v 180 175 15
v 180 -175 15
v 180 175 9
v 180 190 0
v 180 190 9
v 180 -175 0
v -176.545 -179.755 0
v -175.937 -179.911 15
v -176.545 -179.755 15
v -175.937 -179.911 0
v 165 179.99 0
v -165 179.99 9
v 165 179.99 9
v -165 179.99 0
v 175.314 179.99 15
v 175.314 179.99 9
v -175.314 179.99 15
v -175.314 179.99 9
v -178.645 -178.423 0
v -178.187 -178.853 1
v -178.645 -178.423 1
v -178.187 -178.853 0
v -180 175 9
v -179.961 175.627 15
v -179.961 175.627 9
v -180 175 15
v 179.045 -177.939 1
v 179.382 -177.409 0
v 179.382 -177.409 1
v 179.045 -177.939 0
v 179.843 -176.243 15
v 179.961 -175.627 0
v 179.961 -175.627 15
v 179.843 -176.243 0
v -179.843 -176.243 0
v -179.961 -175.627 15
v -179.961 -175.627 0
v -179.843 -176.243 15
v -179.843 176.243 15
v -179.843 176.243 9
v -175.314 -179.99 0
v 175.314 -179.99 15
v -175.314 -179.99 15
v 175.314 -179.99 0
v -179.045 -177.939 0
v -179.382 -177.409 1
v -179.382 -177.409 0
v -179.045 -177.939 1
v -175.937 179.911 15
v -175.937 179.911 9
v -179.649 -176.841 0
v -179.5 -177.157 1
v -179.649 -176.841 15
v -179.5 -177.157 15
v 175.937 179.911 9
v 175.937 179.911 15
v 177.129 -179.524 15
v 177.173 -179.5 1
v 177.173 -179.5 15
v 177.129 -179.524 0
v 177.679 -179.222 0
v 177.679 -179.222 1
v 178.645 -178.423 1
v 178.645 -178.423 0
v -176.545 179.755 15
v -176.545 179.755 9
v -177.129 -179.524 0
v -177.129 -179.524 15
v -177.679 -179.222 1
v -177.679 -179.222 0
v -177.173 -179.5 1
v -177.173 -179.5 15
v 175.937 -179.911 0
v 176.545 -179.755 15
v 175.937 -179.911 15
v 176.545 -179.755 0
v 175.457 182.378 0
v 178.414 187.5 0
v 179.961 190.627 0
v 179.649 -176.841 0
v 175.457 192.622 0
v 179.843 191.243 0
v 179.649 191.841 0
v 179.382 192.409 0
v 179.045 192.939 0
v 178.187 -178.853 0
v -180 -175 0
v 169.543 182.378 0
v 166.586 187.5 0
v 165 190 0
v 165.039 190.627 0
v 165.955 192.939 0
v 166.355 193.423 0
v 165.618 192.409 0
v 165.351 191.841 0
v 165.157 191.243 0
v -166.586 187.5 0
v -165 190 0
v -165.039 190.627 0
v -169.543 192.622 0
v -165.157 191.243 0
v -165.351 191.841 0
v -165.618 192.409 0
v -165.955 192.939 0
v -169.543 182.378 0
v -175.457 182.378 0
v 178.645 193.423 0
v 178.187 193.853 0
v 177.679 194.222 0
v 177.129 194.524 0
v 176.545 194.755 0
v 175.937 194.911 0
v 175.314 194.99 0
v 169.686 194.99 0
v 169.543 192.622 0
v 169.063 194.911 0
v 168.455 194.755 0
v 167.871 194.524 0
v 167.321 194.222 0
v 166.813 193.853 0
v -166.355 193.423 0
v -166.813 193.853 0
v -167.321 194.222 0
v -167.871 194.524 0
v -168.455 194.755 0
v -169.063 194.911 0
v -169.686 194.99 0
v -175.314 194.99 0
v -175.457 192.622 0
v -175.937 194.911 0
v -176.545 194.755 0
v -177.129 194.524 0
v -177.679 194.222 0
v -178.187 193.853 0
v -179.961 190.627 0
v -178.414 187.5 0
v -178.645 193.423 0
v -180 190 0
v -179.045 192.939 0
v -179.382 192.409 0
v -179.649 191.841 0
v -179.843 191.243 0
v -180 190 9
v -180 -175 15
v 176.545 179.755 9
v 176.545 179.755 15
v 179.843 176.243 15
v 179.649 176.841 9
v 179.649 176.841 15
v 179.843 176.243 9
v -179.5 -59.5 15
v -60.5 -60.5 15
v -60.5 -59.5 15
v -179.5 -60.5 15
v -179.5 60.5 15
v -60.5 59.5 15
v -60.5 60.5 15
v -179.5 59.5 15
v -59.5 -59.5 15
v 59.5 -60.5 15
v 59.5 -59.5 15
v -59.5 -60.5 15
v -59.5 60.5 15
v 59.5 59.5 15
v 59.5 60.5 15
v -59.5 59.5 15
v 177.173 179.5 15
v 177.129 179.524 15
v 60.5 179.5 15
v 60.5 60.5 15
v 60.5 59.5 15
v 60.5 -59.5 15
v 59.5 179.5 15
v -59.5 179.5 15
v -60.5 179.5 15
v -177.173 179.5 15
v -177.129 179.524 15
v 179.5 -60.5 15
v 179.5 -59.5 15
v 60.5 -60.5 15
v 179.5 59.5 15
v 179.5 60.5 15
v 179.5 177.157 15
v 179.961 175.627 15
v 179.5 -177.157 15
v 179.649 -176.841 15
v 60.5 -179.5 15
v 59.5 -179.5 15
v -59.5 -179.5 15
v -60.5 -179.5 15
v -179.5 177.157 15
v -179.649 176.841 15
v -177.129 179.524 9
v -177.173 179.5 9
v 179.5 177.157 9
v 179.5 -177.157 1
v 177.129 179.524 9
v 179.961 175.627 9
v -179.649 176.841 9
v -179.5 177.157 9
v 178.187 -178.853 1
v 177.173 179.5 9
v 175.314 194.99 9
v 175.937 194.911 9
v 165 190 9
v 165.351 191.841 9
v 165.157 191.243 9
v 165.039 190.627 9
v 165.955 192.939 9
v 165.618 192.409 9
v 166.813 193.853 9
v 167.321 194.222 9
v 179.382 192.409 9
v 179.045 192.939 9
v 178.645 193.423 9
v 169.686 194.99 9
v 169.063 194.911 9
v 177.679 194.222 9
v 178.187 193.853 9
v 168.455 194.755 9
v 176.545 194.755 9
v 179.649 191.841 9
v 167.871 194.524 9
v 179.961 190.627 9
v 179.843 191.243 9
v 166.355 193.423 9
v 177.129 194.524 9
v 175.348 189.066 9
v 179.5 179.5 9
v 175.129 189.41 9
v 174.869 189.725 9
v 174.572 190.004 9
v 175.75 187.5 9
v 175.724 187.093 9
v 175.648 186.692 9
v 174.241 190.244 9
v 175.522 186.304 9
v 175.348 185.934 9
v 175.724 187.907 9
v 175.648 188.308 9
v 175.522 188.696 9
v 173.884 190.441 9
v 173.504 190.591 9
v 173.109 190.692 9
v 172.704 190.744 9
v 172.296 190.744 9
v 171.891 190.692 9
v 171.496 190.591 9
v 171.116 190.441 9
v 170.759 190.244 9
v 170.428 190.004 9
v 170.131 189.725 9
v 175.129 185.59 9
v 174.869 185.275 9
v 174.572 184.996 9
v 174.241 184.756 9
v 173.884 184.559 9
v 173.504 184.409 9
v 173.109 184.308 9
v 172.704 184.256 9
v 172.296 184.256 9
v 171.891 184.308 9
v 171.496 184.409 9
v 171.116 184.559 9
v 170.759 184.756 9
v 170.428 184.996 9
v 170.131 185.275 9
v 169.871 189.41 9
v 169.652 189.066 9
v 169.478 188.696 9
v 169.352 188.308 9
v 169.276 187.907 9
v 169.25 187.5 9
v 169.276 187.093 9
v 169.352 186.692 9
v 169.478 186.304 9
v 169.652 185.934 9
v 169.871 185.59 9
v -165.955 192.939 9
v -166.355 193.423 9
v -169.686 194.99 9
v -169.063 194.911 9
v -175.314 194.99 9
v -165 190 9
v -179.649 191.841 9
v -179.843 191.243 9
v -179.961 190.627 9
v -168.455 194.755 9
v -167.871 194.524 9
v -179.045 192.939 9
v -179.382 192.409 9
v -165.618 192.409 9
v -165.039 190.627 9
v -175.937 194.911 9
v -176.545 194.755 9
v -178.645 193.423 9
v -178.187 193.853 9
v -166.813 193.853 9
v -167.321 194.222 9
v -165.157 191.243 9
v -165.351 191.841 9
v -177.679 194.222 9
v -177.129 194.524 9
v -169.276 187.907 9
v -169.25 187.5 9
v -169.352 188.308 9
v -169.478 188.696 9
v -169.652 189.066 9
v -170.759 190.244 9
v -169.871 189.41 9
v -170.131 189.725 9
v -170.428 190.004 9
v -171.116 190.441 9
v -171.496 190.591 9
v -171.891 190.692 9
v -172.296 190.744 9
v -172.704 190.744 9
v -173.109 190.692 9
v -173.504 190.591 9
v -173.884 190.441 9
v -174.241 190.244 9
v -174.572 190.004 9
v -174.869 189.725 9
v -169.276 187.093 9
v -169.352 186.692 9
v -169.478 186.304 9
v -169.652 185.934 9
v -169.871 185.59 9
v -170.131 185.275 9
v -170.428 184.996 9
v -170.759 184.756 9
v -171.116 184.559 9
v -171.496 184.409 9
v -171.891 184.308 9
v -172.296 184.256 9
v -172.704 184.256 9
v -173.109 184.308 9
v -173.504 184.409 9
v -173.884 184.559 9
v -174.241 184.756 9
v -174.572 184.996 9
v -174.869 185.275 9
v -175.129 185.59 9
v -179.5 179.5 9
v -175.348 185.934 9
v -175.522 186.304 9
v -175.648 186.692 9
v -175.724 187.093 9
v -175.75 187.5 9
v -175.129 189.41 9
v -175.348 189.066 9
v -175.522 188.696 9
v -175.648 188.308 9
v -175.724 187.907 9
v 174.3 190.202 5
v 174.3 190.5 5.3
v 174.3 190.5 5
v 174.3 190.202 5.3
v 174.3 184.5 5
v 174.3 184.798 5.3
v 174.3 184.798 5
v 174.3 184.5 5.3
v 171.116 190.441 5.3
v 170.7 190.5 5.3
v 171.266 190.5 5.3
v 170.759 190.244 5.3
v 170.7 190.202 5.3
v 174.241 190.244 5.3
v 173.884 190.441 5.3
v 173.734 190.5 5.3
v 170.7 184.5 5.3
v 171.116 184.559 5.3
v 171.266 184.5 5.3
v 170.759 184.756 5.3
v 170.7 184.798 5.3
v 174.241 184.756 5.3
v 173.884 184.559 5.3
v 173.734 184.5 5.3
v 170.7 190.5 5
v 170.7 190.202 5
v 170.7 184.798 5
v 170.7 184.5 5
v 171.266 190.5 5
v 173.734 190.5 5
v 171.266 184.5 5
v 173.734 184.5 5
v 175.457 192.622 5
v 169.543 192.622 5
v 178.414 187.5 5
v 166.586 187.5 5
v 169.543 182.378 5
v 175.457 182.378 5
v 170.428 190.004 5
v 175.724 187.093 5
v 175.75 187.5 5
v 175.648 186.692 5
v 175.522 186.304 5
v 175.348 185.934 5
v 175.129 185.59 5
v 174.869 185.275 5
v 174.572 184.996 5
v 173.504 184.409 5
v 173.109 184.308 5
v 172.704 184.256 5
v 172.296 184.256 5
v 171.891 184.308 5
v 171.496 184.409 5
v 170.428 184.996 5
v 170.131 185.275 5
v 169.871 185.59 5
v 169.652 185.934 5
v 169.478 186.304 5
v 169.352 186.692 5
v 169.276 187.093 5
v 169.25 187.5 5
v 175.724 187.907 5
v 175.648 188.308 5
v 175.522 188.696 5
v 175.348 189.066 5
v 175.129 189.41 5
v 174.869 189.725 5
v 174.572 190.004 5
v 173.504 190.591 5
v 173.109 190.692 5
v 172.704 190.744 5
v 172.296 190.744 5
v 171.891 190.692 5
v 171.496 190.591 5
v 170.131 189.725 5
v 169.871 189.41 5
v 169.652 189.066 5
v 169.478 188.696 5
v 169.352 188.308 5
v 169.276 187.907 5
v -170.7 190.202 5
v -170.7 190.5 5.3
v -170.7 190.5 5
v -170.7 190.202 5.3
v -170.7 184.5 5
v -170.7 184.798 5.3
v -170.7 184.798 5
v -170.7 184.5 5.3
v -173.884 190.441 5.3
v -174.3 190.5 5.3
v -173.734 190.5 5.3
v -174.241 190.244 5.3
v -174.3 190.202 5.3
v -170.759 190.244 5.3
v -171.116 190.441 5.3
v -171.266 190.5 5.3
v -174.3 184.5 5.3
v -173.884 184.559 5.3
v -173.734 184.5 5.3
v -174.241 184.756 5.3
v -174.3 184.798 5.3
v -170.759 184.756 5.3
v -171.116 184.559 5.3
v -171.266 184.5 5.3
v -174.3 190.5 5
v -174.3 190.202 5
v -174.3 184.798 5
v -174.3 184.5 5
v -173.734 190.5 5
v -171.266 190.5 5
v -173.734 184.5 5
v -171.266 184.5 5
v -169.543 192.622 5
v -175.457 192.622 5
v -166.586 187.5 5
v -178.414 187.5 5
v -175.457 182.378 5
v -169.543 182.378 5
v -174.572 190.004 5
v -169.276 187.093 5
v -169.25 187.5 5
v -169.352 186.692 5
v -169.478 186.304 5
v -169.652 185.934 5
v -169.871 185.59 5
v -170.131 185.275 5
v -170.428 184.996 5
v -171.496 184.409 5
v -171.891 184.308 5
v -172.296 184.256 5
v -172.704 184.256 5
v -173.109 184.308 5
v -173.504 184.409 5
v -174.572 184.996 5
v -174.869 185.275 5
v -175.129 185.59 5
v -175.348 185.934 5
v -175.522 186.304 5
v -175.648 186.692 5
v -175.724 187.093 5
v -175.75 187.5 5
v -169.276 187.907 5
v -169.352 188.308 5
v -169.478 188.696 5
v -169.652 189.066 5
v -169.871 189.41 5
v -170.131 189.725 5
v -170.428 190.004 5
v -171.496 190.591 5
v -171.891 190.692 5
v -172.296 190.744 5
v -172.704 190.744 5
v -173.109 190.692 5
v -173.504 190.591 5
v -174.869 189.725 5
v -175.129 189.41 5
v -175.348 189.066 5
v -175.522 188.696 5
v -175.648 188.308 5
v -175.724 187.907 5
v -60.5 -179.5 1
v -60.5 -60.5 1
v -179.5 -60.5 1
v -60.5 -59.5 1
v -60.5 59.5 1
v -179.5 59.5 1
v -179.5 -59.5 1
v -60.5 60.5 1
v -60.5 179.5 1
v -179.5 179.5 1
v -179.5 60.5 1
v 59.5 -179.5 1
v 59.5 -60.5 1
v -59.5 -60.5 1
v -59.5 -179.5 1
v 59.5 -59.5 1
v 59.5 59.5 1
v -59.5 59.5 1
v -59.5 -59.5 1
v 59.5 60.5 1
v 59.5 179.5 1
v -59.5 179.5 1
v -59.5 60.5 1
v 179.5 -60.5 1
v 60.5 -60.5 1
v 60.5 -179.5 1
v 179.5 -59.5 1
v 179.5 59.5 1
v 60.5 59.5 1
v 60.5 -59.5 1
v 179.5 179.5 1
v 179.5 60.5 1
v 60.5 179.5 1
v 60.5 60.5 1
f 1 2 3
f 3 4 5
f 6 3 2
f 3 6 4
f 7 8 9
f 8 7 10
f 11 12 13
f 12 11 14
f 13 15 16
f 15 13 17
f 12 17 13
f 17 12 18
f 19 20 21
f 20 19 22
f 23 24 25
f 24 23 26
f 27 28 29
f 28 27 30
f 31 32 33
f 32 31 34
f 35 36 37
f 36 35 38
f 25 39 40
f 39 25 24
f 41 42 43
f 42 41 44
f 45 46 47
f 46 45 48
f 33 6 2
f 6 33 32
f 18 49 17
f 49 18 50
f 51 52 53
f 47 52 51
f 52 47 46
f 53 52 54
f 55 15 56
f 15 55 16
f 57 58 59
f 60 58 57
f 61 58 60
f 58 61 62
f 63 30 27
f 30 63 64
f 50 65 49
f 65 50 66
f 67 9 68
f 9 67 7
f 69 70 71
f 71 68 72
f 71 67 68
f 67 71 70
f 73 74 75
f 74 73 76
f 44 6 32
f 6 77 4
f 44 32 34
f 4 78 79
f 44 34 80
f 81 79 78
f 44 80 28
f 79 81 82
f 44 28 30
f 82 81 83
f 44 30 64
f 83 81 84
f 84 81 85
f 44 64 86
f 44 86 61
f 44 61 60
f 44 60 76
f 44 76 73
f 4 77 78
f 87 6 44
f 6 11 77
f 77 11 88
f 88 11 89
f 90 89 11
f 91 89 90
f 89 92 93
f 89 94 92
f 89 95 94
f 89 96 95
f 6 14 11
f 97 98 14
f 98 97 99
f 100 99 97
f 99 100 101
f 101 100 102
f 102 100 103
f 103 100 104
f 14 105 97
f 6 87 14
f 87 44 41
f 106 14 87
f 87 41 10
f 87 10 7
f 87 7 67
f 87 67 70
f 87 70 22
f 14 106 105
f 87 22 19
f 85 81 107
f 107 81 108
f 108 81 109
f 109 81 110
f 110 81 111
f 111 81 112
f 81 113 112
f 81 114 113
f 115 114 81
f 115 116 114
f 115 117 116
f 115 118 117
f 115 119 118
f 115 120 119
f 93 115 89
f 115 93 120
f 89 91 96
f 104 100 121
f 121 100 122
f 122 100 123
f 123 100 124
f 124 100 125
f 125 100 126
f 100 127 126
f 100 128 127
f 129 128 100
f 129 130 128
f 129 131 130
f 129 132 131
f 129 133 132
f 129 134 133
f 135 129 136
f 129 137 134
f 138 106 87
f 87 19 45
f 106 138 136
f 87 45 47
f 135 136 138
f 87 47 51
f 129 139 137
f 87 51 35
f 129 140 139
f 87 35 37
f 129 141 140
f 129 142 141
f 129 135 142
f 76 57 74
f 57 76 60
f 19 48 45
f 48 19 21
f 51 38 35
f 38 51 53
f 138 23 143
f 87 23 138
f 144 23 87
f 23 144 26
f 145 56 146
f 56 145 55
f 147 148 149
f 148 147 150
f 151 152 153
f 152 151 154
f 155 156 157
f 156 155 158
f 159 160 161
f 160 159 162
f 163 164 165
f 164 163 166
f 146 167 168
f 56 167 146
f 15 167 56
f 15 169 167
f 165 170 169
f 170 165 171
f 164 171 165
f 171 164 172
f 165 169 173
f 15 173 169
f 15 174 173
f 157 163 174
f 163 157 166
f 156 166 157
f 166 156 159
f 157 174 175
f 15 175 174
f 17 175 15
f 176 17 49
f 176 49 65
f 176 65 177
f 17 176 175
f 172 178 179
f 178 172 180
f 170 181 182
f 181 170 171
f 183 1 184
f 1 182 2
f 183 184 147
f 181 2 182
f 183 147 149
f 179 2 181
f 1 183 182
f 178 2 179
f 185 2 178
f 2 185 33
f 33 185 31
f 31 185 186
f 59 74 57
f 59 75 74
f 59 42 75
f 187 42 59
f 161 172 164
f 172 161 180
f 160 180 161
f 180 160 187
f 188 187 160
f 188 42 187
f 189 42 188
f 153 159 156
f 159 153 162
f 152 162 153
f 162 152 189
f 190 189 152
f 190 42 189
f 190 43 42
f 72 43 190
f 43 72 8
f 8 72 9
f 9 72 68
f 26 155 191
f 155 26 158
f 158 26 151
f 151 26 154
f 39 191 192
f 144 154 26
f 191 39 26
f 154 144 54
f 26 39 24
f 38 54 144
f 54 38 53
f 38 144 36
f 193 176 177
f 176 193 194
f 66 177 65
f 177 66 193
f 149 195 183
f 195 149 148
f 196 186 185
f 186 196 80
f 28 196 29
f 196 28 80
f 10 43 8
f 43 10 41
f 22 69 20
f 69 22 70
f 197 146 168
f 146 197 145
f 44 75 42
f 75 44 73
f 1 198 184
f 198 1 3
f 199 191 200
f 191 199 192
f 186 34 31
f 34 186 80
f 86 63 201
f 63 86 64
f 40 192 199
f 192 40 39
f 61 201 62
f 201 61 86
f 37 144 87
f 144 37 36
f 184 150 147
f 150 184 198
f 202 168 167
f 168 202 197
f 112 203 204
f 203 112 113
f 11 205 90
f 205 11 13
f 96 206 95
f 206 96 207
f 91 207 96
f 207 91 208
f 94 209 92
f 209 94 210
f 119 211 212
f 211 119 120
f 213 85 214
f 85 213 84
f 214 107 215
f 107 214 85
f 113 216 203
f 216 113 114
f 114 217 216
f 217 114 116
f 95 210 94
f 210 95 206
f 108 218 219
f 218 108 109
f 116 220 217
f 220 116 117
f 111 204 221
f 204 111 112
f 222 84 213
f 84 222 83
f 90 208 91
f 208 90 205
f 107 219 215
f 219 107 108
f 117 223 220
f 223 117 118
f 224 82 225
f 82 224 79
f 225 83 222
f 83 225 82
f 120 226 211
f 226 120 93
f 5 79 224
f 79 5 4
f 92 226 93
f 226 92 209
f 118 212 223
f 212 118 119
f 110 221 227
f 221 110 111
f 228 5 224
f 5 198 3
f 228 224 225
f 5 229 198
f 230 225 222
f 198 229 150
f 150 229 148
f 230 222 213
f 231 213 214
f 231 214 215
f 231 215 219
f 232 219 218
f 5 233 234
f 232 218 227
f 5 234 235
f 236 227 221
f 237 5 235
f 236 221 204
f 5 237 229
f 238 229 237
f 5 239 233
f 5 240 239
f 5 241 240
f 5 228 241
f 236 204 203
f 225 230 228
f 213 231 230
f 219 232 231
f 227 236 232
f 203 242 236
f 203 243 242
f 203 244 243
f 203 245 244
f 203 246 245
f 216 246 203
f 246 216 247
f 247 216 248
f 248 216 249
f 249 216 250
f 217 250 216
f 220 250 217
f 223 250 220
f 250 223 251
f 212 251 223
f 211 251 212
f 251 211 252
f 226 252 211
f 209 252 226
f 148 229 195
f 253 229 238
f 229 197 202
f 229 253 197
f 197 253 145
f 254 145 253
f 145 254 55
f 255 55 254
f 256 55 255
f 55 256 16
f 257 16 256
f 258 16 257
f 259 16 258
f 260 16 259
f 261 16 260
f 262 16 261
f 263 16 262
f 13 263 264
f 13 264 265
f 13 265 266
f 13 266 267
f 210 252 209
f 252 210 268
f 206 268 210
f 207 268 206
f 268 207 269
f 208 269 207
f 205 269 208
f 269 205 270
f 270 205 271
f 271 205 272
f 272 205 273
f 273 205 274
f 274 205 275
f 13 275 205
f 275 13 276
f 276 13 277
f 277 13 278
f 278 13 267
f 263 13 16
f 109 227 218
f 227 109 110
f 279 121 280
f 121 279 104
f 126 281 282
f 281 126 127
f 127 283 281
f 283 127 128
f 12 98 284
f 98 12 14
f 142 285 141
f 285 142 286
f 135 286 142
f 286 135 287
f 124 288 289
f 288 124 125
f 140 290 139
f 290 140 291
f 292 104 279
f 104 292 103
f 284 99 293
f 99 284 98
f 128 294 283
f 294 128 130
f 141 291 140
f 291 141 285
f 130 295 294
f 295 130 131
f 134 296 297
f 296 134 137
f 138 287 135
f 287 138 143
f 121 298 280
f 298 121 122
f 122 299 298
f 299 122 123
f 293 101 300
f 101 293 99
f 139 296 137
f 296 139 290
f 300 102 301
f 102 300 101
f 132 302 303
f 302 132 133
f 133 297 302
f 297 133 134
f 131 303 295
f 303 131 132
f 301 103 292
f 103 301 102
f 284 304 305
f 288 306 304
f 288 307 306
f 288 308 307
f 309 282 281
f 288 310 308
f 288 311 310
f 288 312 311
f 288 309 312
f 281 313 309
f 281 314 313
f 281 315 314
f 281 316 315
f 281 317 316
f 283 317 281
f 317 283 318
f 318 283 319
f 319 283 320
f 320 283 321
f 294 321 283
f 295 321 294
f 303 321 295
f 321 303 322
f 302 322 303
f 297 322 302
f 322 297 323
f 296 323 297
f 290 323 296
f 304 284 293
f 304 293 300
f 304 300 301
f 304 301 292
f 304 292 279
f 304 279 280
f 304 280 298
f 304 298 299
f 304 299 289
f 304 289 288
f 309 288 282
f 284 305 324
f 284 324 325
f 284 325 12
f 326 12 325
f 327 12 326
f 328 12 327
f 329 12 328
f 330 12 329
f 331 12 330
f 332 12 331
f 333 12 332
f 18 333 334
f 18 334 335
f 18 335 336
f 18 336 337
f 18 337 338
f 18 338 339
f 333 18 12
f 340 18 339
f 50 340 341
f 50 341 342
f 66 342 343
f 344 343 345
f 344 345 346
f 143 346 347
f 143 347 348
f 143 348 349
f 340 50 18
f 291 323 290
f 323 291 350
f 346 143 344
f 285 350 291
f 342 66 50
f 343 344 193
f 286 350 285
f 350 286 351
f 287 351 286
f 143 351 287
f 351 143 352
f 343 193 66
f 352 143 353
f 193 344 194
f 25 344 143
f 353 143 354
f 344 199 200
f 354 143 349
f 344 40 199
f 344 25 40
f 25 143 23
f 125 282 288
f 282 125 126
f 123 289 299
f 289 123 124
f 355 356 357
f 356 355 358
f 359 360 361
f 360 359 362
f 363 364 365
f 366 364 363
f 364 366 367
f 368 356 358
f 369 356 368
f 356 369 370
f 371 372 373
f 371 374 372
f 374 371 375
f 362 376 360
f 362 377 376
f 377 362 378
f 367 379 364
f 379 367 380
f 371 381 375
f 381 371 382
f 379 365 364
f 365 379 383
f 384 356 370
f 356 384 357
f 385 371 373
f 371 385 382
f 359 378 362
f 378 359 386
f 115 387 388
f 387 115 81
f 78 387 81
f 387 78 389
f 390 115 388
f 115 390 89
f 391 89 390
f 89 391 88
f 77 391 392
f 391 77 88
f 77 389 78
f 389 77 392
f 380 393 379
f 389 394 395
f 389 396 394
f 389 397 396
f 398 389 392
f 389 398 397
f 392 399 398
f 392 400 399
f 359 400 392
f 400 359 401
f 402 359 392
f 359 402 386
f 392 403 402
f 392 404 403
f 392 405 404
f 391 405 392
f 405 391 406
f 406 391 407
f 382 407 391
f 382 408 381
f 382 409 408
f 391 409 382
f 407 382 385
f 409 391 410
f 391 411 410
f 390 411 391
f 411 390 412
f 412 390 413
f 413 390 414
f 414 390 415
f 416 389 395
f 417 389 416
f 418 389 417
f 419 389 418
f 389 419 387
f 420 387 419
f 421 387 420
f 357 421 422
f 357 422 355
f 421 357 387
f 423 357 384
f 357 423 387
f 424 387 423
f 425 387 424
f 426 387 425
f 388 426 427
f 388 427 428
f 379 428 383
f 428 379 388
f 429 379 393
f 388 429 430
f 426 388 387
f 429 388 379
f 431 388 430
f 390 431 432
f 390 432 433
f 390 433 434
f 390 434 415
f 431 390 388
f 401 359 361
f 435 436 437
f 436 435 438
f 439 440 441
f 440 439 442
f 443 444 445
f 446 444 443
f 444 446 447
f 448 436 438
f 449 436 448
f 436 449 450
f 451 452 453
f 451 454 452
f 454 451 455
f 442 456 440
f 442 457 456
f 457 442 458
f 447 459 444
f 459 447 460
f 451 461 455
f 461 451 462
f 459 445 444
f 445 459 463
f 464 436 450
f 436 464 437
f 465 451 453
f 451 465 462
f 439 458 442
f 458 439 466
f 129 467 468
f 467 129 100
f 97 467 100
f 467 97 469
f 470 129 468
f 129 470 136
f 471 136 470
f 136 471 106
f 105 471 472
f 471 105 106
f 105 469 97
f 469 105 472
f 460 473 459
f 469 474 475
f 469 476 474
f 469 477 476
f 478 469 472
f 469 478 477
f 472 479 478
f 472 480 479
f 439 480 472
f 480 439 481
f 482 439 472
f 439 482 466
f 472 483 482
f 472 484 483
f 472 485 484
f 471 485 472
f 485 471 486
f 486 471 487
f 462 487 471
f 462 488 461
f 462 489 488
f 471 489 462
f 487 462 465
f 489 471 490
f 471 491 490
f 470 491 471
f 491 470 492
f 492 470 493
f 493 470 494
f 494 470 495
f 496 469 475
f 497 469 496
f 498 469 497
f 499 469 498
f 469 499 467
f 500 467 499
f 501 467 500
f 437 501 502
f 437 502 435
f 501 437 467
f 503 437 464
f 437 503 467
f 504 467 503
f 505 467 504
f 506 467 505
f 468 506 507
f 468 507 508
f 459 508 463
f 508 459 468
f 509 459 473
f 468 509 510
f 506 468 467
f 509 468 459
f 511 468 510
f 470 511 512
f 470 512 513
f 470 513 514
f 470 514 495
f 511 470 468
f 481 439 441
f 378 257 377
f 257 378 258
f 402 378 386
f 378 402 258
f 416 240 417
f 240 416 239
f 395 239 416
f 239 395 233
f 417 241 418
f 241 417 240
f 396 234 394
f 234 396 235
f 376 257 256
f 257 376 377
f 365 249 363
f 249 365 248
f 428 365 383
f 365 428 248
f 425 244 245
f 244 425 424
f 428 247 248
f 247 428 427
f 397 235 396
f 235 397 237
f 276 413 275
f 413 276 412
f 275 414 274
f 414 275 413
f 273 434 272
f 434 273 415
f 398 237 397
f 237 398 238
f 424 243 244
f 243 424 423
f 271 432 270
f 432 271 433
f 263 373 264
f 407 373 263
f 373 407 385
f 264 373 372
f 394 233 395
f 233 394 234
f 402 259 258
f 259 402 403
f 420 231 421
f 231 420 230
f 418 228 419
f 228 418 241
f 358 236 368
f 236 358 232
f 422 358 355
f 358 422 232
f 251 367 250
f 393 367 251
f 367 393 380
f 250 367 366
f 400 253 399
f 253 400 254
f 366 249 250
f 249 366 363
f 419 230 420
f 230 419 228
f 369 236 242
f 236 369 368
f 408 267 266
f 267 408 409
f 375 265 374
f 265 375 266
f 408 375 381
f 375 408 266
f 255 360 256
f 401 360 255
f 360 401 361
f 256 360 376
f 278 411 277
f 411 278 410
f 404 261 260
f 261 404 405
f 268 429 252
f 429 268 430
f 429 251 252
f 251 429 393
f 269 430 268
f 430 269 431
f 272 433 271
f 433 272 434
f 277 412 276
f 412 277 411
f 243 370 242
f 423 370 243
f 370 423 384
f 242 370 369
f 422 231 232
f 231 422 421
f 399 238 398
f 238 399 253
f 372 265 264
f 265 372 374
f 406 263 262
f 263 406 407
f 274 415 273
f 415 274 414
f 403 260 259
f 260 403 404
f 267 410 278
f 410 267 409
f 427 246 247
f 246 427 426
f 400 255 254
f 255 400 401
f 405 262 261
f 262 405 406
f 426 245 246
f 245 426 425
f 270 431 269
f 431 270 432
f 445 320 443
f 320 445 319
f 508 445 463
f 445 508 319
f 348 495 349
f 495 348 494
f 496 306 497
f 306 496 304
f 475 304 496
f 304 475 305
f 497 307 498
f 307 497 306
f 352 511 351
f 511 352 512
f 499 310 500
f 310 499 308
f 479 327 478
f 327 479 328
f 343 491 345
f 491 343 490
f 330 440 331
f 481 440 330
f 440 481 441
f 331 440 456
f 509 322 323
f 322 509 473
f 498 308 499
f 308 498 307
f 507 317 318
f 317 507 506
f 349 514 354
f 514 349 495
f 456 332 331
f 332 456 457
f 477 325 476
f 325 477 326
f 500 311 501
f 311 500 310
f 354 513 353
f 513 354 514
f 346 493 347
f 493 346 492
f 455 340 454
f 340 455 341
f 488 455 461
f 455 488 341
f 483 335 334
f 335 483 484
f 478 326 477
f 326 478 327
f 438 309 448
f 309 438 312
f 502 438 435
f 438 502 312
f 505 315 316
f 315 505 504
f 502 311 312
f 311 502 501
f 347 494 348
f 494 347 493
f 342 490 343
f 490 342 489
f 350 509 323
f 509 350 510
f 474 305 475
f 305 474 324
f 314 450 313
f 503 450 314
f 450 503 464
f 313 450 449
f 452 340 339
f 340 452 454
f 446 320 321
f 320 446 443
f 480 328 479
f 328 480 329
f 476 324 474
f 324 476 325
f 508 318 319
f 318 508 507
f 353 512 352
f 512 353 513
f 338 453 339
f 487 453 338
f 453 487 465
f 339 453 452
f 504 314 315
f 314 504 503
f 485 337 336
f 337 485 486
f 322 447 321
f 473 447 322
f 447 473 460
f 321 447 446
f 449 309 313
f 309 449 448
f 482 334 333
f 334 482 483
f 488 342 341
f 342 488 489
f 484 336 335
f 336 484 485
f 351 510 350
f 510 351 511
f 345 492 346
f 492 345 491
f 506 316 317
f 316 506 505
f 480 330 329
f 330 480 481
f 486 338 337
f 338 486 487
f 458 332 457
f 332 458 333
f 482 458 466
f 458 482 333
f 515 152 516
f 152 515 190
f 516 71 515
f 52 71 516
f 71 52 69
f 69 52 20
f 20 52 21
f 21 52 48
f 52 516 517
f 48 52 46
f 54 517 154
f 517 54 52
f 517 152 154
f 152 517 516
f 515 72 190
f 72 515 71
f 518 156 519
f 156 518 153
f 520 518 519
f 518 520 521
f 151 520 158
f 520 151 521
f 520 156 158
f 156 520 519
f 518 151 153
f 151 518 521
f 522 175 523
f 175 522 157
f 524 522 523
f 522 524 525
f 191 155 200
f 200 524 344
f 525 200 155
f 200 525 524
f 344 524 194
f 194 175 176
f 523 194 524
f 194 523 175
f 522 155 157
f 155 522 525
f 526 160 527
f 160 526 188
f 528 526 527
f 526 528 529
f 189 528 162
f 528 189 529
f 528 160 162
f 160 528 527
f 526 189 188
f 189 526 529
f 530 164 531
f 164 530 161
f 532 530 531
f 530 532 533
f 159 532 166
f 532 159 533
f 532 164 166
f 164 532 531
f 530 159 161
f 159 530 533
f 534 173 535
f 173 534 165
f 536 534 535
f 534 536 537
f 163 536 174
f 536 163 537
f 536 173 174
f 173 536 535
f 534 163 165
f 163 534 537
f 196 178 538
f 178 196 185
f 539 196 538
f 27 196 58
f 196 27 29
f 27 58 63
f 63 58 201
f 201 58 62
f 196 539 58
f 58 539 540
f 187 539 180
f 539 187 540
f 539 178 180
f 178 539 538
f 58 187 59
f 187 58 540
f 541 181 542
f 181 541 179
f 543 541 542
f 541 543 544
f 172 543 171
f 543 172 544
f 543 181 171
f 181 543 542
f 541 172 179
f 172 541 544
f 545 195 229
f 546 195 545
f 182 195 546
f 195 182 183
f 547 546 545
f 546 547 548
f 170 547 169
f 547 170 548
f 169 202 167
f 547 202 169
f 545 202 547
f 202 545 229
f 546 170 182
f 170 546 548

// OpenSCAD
$fn = 50;


difference() {
	union() {
		hull() {
			translate(v = [-175.0000000000, 175.0000000000, 0]) {
				cylinder(h = 15, r = 5);
			}
			translate(v = [175.0000000000, 175.0000000000, 0]) {
				cylinder(h = 15, r = 5);
			}
			translate(v = [-175.0000000000, -175.0000000000, 0]) {
				cylinder(h = 15, r = 5);
			}
			translate(v = [175.0000000000, -175.0000000000, 0]) {
				cylinder(h = 15, r = 5);
			}
		}
		translate(v = [172.5000000000, 7.5000000000, 0]) {
			hull() {
				translate(v = [-2.5000000000, 182.5000000000, 0]) {
					cylinder(h = 9, r = 5);
				}
				translate(v = [2.5000000000, 182.5000000000, 0]) {
					cylinder(h = 9, r = 5);
				}
				translate(v = [-2.5000000000, -182.5000000000, 0]) {
					cylinder(h = 9, r = 5);
				}
				translate(v = [2.5000000000, -182.5000000000, 0]) {
					cylinder(h = 9, r = 5);
				}
			}
		}
		translate(v = [-172.5000000000, 7.5000000000, 0]) {
			hull() {
				translate(v = [-2.5000000000, 182.5000000000, 0]) {
					cylinder(h = 9, r = 5);
				}
				translate(v = [2.5000000000, 182.5000000000, 0]) {
					cylinder(h = 9, r = 5);
				}
				translate(v = [-2.5000000000, -182.5000000000, 0]) {
					cylinder(h = 9, r = 5);
				}
				translate(v = [2.5000000000, -182.5000000000, 0]) {
					cylinder(h = 9, r = 5);
				}
			}
		}
	}
	union() {
		translate(v = [172.5000000000, 187.5000000000, 0]) {
			rotate(a = [0, 0, 0]) {
				difference() {
					union() {
						translate(v = [-1.8000000000, -3.0000000000, -0.3000000000]) {
							cube(size = [3.6000000000, 6.0000000000, 0.3000000000]);
						}
						translate(v = [-1.8000000000, -1.8000000000, -0.6000000000]) {
							cube(size = [3.6000000000, 3.6000000000, 0.3000000000]);
						}
						translate(v = [-1.8000000000, -3.0000000000, 5]) {
							cube(size = [3.6000000000, 6.0000000000, 0.3000000000]);
						}
						translate(v = [-1.8000000000, -1.8000000000, 5.3000000000]) {
							cube(size = [3.6000000000, 3.6000000000, 0.3000000000]);
						}
						linear_extrude(height = 5) {
							polygon(points = [[5.9142500000, 0.0000000000], [2.9571250000, 5.1218907443], [-2.9571250000, 5.1218907443], [-5.9142500000, 0.0000000000], [-2.9571250000, -5.1218907443], [2.9571250000, -5.1218907443]]);
						}
						translate(v = [-1.8000000000, -3.0000000000, -0.3000000000]) {
							cube(size = [3.6000000000, 6.0000000000, 0.3000000000]);
						}
						translate(v = [-1.8000000000, -1.8000000000, -0.6000000000]) {
							cube(size = [3.6000000000, 3.6000000000, 0.3000000000]);
						}
						translate(v = [-1.8000000000, -3.0000000000, 5]) {
							cube(size = [3.6000000000, 6.0000000000, 0.3000000000]);
						}
						translate(v = [-1.8000000000, -1.8000000000, 5.3000000000]) {
							cube(size = [3.6000000000, 3.6000000000, 0.3000000000]);
						}
						translate(v = [-1.8000000000, -3.0000000000, -0.3000000000]) {
							cube(size = [3.6000000000, 6.0000000000, 0.3000000000]);
						}
						translate(v = [-1.8000000000, -1.8000000000, -0.6000000000]) {
							cube(size = [3.6000000000, 3.6000000000, 0.3000000000]);
						}
						translate(v = [-1.8000000000, -3.0000000000, 5]) {
							cube(size = [3.6000000000, 6.0000000000, 0.3000000000]);
						}
						translate(v = [-1.8000000000, -1.8000000000, 5.3000000000]) {
							cube(size = [3.6000000000, 3.6000000000, 0.3000000000]);
						}
					}
					union();
				}
			}
		}
		translate(v = [-172.5000000000, 187.5000000000, 0]) {
			rotate(a = [0, 0, 0]) {
				difference() {
					union() {
						translate(v = [-1.8000000000, -3.0000000000, -0.3000000000]) {
							cube(size = [3.6000000000, 6.0000000000, 0.3000000000]);
						}
						translate(v = [-1.8000000000, -1.8000000000, -0.6000000000]) {
							cube(size = [3.6000000000, 3.6000000000, 0.3000000000]);
						}
						translate(v = [-1.8000000000, -3.0000000000, 5]) {
							cube(size = [3.6000000000, 6.0000000000, 0.3000000000]);
						}
						translate(v = [-1.8000000000, -1.8000000000, 5.3000000000]) {
							cube(size = [3.6000000000, 3.6000000000, 0.3000000000]);
						}
						linear_extrude(height = 5) {
							polygon(points = [[5.9142500000, 0.0000000000], [2.9571250000, 5.1218907443], [-2.9571250000, 5.1218907443], [-5.9142500000, 0.0000000000], [-2.9571250000, -5.1218907443], [2.9571250000, -5.1218907443]]);
						}
						translate(v = [-1.8000000000, -3.0000000000, -0.3000000000]) {
							cube(size = [3.6000000000, 6.0000000000, 0.3000000000]);
						}
						translate(v = [-1.8000000000, -1.8000000000, -0.6000000000]) {
							cube(size = [3.6000000000, 3.6000000000, 0.3000000000]);
						}
						translate(v = [-1.8000000000, -3.0000000000, 5]) {
							cube(size = [3.6000000000, 6.0000000000, 0.3000000000]);
						}
						translate(v = [-1.8000000000, -1.8000000000, 5.3000000000]) {
							cube(size = [3.6000000000, 3.6000000000, 0.3000000000]);
						}
						translate(v = [-1.8000000000, -3.0000000000, -0.3000000000]) {
							cube(size = [3.6000000000, 6.0000000000, 0.3000000000]);
						}
						translate(v = [-1.8000000000, -1.8000000000, -0.6000000000]) {
							cube(size = [3.6000000000, 3.6000000000, 0.3000000000]);
						}
						translate(v = [-1.8000000000, -3.0000000000, 5]) {
							cube(size = [3.6000000000, 6.0000000000, 0.3000000000]);
						}
						translate(v = [-1.8000000000, -1.8000000000, 5.3000000000]) {
							cube(size = [3.6000000000, 3.6000000000, 0.3000000000]);
						}
					}
					union();
				}
			}
		}
		translate(v = [172.5000000000, 187.5000000000, -100.0000000000]) {
			cylinder(h = 200, r = 3.2500000000);
		}
		translate(v = [-172.5000000000, 187.5000000000, -100.0000000000]) {
			cylinder(h = 200, r = 3.2500000000);
		}
		#translate(v = [-179.5000000000, -179.5000000000, 1]) {
			cube(size = [119, 119, 30]);
		}
		#translate(v = [-179.5000000000, -59.5000000000, 1]) {
			cube(size = [119, 119, 30]);
		}
		#translate(v = [-179.5000000000, 60.5000000000, 1]) {
			cube(size = [119, 119, 30]);
		}
		#translate(v = [-59.5000000000, -179.5000000000, 1]) {
			cube(size = [119, 119, 30]);
		}
		#translate(v = [-59.5000000000, -59.5000000000, 1]) {
			cube(size = [119, 119, 30]);
		}
		#translate(v = [-59.5000000000, 60.5000000000, 1]) {
			cube(size = [119, 119, 30]);
		}
		#translate(v = [60.5000000000, -179.5000000000, 1]) {
			cube(size = [119, 119, 30]);
		}
		#translate(v = [60.5000000000, -59.5000000000, 1]) {
			cube(size = [119, 119, 30]);
		}
		#translate(v = [60.5000000000, 60.5000000000, 1]) {
			cube(size = [119, 119, 30]);
		}
	}
}
